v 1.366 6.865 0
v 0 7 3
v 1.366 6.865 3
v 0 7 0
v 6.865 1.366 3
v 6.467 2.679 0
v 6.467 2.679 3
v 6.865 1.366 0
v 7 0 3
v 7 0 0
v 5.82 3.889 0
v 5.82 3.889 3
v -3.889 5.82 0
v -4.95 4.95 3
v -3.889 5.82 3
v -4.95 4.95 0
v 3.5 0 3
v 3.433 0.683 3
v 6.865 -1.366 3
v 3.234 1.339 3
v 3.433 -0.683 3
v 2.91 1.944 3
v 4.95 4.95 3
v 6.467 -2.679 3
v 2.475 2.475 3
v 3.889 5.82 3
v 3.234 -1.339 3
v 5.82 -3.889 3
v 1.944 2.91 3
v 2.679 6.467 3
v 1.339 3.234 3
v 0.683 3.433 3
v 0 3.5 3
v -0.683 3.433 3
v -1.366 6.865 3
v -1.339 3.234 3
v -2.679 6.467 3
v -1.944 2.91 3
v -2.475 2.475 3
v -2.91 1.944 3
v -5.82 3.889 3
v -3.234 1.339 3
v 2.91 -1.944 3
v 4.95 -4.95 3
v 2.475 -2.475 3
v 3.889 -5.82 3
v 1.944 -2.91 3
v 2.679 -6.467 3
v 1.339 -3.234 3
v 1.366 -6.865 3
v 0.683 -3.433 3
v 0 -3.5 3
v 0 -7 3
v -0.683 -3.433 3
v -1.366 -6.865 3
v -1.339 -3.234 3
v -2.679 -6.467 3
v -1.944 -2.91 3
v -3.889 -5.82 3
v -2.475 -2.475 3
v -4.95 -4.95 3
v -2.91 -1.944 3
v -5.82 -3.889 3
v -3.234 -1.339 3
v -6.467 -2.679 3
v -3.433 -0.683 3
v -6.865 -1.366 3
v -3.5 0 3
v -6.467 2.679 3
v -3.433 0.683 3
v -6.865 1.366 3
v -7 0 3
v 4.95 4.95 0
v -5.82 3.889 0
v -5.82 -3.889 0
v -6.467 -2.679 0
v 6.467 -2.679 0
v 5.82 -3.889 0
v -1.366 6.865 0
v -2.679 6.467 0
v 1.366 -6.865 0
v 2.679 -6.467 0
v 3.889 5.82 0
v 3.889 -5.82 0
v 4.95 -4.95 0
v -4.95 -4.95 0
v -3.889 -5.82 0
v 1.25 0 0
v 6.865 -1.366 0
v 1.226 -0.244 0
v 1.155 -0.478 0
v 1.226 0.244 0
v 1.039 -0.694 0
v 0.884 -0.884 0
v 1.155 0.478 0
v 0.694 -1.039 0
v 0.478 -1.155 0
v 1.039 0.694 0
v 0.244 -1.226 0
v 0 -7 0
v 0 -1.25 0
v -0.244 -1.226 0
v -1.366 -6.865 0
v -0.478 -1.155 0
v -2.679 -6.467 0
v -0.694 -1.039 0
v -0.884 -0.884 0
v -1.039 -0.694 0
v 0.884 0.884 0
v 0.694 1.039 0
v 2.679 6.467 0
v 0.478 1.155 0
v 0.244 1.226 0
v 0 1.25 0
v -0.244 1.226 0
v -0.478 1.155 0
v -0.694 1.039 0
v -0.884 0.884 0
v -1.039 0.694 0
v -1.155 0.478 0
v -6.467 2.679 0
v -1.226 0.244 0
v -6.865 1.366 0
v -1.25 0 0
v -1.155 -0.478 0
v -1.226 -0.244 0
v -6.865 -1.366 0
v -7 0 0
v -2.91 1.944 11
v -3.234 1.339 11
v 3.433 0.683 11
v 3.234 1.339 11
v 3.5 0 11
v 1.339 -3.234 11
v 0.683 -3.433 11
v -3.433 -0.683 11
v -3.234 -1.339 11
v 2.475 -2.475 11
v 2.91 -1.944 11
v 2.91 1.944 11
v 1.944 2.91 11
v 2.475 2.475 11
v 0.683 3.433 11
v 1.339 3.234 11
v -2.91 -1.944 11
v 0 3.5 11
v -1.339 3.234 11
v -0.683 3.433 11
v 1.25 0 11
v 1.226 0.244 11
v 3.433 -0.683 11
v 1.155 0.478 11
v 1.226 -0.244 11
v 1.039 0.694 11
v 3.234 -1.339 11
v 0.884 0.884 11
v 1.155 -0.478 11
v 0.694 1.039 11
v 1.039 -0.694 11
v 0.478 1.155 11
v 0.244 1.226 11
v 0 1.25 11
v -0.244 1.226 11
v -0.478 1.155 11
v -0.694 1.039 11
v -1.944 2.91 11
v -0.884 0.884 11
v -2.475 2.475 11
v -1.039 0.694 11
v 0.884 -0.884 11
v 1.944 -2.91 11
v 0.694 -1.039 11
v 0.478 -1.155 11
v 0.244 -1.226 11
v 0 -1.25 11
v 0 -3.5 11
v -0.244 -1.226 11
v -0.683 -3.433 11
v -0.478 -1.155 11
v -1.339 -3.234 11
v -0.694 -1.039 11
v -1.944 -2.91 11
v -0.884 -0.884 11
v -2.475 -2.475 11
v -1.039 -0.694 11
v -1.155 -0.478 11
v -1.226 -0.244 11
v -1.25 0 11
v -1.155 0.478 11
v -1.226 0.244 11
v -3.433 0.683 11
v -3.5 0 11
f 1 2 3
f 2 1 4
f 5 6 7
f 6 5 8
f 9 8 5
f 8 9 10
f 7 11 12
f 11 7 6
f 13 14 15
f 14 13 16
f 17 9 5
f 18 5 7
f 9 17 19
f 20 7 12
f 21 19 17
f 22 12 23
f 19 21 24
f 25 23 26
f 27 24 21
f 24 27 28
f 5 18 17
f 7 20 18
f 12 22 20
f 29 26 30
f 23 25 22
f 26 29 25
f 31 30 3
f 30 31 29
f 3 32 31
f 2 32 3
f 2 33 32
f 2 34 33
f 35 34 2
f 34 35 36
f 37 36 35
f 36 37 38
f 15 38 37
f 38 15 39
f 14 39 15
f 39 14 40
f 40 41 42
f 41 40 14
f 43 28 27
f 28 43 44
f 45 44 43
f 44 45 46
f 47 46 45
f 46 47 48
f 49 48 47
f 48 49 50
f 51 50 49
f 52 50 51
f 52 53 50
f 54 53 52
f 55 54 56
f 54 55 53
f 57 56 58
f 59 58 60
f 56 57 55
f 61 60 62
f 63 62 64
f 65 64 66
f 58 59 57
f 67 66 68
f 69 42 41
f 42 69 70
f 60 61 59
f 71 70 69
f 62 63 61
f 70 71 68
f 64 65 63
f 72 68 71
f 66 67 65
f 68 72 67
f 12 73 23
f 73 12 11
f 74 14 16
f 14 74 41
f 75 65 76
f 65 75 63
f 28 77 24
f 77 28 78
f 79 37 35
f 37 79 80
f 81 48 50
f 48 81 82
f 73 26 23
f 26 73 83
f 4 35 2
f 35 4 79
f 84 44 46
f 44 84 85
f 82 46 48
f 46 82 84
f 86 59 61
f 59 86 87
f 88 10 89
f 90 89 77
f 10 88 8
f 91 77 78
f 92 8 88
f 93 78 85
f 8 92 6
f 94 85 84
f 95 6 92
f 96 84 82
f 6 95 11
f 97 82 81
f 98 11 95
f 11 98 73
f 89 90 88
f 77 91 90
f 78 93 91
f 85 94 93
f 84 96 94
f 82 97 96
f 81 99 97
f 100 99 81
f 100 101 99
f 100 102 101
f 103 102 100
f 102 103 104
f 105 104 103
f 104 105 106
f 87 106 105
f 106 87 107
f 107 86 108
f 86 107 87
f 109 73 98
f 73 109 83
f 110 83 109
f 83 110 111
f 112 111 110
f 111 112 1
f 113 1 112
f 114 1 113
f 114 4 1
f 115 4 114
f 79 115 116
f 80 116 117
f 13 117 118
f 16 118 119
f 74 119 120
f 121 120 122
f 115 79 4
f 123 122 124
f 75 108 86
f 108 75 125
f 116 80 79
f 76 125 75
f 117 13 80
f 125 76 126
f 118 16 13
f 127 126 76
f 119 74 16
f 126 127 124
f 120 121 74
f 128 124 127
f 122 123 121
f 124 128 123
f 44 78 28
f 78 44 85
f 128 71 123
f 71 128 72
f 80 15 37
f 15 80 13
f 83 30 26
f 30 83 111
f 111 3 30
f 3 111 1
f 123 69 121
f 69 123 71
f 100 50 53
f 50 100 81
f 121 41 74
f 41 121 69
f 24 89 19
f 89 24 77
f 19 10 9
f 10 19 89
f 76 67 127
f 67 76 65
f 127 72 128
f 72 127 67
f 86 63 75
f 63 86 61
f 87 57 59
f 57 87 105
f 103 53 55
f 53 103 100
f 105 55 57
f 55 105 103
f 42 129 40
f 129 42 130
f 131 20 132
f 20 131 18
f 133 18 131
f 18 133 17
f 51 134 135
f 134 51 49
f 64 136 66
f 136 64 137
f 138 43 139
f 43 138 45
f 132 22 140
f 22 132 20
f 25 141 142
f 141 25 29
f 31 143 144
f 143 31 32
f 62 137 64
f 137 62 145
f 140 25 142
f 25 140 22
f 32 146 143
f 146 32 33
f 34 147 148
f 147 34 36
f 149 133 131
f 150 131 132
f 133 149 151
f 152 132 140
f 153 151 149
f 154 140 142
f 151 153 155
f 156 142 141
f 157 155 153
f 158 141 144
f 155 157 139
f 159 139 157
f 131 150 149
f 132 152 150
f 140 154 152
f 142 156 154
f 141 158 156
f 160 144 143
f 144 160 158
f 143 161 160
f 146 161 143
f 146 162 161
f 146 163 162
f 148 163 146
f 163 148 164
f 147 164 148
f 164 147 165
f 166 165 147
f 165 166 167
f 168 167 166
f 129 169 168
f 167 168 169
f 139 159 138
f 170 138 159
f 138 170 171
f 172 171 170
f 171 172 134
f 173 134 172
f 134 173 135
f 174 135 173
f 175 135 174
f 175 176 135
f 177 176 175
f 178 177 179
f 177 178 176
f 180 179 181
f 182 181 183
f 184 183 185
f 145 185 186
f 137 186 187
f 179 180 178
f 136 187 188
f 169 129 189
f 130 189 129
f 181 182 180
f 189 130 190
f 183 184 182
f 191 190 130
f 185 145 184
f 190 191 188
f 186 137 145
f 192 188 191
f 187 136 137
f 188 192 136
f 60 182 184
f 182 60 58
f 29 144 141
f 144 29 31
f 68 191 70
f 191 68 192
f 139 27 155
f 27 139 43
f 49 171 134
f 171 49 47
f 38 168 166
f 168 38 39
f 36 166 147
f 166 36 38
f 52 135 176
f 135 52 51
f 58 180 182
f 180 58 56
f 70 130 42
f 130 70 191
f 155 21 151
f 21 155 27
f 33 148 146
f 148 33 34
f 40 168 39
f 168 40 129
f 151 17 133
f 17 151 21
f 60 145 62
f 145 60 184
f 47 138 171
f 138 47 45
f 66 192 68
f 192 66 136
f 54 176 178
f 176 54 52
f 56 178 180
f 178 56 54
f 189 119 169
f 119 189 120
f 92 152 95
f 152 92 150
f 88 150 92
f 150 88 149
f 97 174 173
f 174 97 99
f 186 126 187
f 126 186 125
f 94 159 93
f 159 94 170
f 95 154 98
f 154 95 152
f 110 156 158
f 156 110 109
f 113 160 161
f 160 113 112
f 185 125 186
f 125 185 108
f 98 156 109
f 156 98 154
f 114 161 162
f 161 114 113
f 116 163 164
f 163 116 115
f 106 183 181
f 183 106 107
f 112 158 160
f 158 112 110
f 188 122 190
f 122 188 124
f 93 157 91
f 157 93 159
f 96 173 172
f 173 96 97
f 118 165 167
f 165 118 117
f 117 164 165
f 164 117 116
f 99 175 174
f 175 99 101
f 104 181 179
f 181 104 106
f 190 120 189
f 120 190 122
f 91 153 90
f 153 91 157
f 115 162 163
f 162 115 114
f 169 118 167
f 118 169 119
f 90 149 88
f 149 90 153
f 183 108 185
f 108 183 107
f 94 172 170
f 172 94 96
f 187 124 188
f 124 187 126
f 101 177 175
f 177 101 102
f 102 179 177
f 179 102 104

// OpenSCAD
$fn = 32;

// ----------------------------------------------------------------------
// Micro post: flanged post, 5-20 mm class
// ----------------------------------------------------------------------

// --- parameters (mm) ---
post_d = 7;               // post diameter
post_h = 8;               // post height above the flange
flange_d = 14;            // flange diameter
flange_t = 3;             // flange thickness
bore_d = 2.5;             // through bore

total_h = post_h + flange_t;  // overall height

difference() {
  union() {
    cylinder(h = flange_t, d = flange_d);
    translate([0, 0, flange_t]) cylinder(h = post_h, d = post_d);
  }
  translate([0, 0, -1]) cylinder(h = total_h + 2, d = bore_d);
}
